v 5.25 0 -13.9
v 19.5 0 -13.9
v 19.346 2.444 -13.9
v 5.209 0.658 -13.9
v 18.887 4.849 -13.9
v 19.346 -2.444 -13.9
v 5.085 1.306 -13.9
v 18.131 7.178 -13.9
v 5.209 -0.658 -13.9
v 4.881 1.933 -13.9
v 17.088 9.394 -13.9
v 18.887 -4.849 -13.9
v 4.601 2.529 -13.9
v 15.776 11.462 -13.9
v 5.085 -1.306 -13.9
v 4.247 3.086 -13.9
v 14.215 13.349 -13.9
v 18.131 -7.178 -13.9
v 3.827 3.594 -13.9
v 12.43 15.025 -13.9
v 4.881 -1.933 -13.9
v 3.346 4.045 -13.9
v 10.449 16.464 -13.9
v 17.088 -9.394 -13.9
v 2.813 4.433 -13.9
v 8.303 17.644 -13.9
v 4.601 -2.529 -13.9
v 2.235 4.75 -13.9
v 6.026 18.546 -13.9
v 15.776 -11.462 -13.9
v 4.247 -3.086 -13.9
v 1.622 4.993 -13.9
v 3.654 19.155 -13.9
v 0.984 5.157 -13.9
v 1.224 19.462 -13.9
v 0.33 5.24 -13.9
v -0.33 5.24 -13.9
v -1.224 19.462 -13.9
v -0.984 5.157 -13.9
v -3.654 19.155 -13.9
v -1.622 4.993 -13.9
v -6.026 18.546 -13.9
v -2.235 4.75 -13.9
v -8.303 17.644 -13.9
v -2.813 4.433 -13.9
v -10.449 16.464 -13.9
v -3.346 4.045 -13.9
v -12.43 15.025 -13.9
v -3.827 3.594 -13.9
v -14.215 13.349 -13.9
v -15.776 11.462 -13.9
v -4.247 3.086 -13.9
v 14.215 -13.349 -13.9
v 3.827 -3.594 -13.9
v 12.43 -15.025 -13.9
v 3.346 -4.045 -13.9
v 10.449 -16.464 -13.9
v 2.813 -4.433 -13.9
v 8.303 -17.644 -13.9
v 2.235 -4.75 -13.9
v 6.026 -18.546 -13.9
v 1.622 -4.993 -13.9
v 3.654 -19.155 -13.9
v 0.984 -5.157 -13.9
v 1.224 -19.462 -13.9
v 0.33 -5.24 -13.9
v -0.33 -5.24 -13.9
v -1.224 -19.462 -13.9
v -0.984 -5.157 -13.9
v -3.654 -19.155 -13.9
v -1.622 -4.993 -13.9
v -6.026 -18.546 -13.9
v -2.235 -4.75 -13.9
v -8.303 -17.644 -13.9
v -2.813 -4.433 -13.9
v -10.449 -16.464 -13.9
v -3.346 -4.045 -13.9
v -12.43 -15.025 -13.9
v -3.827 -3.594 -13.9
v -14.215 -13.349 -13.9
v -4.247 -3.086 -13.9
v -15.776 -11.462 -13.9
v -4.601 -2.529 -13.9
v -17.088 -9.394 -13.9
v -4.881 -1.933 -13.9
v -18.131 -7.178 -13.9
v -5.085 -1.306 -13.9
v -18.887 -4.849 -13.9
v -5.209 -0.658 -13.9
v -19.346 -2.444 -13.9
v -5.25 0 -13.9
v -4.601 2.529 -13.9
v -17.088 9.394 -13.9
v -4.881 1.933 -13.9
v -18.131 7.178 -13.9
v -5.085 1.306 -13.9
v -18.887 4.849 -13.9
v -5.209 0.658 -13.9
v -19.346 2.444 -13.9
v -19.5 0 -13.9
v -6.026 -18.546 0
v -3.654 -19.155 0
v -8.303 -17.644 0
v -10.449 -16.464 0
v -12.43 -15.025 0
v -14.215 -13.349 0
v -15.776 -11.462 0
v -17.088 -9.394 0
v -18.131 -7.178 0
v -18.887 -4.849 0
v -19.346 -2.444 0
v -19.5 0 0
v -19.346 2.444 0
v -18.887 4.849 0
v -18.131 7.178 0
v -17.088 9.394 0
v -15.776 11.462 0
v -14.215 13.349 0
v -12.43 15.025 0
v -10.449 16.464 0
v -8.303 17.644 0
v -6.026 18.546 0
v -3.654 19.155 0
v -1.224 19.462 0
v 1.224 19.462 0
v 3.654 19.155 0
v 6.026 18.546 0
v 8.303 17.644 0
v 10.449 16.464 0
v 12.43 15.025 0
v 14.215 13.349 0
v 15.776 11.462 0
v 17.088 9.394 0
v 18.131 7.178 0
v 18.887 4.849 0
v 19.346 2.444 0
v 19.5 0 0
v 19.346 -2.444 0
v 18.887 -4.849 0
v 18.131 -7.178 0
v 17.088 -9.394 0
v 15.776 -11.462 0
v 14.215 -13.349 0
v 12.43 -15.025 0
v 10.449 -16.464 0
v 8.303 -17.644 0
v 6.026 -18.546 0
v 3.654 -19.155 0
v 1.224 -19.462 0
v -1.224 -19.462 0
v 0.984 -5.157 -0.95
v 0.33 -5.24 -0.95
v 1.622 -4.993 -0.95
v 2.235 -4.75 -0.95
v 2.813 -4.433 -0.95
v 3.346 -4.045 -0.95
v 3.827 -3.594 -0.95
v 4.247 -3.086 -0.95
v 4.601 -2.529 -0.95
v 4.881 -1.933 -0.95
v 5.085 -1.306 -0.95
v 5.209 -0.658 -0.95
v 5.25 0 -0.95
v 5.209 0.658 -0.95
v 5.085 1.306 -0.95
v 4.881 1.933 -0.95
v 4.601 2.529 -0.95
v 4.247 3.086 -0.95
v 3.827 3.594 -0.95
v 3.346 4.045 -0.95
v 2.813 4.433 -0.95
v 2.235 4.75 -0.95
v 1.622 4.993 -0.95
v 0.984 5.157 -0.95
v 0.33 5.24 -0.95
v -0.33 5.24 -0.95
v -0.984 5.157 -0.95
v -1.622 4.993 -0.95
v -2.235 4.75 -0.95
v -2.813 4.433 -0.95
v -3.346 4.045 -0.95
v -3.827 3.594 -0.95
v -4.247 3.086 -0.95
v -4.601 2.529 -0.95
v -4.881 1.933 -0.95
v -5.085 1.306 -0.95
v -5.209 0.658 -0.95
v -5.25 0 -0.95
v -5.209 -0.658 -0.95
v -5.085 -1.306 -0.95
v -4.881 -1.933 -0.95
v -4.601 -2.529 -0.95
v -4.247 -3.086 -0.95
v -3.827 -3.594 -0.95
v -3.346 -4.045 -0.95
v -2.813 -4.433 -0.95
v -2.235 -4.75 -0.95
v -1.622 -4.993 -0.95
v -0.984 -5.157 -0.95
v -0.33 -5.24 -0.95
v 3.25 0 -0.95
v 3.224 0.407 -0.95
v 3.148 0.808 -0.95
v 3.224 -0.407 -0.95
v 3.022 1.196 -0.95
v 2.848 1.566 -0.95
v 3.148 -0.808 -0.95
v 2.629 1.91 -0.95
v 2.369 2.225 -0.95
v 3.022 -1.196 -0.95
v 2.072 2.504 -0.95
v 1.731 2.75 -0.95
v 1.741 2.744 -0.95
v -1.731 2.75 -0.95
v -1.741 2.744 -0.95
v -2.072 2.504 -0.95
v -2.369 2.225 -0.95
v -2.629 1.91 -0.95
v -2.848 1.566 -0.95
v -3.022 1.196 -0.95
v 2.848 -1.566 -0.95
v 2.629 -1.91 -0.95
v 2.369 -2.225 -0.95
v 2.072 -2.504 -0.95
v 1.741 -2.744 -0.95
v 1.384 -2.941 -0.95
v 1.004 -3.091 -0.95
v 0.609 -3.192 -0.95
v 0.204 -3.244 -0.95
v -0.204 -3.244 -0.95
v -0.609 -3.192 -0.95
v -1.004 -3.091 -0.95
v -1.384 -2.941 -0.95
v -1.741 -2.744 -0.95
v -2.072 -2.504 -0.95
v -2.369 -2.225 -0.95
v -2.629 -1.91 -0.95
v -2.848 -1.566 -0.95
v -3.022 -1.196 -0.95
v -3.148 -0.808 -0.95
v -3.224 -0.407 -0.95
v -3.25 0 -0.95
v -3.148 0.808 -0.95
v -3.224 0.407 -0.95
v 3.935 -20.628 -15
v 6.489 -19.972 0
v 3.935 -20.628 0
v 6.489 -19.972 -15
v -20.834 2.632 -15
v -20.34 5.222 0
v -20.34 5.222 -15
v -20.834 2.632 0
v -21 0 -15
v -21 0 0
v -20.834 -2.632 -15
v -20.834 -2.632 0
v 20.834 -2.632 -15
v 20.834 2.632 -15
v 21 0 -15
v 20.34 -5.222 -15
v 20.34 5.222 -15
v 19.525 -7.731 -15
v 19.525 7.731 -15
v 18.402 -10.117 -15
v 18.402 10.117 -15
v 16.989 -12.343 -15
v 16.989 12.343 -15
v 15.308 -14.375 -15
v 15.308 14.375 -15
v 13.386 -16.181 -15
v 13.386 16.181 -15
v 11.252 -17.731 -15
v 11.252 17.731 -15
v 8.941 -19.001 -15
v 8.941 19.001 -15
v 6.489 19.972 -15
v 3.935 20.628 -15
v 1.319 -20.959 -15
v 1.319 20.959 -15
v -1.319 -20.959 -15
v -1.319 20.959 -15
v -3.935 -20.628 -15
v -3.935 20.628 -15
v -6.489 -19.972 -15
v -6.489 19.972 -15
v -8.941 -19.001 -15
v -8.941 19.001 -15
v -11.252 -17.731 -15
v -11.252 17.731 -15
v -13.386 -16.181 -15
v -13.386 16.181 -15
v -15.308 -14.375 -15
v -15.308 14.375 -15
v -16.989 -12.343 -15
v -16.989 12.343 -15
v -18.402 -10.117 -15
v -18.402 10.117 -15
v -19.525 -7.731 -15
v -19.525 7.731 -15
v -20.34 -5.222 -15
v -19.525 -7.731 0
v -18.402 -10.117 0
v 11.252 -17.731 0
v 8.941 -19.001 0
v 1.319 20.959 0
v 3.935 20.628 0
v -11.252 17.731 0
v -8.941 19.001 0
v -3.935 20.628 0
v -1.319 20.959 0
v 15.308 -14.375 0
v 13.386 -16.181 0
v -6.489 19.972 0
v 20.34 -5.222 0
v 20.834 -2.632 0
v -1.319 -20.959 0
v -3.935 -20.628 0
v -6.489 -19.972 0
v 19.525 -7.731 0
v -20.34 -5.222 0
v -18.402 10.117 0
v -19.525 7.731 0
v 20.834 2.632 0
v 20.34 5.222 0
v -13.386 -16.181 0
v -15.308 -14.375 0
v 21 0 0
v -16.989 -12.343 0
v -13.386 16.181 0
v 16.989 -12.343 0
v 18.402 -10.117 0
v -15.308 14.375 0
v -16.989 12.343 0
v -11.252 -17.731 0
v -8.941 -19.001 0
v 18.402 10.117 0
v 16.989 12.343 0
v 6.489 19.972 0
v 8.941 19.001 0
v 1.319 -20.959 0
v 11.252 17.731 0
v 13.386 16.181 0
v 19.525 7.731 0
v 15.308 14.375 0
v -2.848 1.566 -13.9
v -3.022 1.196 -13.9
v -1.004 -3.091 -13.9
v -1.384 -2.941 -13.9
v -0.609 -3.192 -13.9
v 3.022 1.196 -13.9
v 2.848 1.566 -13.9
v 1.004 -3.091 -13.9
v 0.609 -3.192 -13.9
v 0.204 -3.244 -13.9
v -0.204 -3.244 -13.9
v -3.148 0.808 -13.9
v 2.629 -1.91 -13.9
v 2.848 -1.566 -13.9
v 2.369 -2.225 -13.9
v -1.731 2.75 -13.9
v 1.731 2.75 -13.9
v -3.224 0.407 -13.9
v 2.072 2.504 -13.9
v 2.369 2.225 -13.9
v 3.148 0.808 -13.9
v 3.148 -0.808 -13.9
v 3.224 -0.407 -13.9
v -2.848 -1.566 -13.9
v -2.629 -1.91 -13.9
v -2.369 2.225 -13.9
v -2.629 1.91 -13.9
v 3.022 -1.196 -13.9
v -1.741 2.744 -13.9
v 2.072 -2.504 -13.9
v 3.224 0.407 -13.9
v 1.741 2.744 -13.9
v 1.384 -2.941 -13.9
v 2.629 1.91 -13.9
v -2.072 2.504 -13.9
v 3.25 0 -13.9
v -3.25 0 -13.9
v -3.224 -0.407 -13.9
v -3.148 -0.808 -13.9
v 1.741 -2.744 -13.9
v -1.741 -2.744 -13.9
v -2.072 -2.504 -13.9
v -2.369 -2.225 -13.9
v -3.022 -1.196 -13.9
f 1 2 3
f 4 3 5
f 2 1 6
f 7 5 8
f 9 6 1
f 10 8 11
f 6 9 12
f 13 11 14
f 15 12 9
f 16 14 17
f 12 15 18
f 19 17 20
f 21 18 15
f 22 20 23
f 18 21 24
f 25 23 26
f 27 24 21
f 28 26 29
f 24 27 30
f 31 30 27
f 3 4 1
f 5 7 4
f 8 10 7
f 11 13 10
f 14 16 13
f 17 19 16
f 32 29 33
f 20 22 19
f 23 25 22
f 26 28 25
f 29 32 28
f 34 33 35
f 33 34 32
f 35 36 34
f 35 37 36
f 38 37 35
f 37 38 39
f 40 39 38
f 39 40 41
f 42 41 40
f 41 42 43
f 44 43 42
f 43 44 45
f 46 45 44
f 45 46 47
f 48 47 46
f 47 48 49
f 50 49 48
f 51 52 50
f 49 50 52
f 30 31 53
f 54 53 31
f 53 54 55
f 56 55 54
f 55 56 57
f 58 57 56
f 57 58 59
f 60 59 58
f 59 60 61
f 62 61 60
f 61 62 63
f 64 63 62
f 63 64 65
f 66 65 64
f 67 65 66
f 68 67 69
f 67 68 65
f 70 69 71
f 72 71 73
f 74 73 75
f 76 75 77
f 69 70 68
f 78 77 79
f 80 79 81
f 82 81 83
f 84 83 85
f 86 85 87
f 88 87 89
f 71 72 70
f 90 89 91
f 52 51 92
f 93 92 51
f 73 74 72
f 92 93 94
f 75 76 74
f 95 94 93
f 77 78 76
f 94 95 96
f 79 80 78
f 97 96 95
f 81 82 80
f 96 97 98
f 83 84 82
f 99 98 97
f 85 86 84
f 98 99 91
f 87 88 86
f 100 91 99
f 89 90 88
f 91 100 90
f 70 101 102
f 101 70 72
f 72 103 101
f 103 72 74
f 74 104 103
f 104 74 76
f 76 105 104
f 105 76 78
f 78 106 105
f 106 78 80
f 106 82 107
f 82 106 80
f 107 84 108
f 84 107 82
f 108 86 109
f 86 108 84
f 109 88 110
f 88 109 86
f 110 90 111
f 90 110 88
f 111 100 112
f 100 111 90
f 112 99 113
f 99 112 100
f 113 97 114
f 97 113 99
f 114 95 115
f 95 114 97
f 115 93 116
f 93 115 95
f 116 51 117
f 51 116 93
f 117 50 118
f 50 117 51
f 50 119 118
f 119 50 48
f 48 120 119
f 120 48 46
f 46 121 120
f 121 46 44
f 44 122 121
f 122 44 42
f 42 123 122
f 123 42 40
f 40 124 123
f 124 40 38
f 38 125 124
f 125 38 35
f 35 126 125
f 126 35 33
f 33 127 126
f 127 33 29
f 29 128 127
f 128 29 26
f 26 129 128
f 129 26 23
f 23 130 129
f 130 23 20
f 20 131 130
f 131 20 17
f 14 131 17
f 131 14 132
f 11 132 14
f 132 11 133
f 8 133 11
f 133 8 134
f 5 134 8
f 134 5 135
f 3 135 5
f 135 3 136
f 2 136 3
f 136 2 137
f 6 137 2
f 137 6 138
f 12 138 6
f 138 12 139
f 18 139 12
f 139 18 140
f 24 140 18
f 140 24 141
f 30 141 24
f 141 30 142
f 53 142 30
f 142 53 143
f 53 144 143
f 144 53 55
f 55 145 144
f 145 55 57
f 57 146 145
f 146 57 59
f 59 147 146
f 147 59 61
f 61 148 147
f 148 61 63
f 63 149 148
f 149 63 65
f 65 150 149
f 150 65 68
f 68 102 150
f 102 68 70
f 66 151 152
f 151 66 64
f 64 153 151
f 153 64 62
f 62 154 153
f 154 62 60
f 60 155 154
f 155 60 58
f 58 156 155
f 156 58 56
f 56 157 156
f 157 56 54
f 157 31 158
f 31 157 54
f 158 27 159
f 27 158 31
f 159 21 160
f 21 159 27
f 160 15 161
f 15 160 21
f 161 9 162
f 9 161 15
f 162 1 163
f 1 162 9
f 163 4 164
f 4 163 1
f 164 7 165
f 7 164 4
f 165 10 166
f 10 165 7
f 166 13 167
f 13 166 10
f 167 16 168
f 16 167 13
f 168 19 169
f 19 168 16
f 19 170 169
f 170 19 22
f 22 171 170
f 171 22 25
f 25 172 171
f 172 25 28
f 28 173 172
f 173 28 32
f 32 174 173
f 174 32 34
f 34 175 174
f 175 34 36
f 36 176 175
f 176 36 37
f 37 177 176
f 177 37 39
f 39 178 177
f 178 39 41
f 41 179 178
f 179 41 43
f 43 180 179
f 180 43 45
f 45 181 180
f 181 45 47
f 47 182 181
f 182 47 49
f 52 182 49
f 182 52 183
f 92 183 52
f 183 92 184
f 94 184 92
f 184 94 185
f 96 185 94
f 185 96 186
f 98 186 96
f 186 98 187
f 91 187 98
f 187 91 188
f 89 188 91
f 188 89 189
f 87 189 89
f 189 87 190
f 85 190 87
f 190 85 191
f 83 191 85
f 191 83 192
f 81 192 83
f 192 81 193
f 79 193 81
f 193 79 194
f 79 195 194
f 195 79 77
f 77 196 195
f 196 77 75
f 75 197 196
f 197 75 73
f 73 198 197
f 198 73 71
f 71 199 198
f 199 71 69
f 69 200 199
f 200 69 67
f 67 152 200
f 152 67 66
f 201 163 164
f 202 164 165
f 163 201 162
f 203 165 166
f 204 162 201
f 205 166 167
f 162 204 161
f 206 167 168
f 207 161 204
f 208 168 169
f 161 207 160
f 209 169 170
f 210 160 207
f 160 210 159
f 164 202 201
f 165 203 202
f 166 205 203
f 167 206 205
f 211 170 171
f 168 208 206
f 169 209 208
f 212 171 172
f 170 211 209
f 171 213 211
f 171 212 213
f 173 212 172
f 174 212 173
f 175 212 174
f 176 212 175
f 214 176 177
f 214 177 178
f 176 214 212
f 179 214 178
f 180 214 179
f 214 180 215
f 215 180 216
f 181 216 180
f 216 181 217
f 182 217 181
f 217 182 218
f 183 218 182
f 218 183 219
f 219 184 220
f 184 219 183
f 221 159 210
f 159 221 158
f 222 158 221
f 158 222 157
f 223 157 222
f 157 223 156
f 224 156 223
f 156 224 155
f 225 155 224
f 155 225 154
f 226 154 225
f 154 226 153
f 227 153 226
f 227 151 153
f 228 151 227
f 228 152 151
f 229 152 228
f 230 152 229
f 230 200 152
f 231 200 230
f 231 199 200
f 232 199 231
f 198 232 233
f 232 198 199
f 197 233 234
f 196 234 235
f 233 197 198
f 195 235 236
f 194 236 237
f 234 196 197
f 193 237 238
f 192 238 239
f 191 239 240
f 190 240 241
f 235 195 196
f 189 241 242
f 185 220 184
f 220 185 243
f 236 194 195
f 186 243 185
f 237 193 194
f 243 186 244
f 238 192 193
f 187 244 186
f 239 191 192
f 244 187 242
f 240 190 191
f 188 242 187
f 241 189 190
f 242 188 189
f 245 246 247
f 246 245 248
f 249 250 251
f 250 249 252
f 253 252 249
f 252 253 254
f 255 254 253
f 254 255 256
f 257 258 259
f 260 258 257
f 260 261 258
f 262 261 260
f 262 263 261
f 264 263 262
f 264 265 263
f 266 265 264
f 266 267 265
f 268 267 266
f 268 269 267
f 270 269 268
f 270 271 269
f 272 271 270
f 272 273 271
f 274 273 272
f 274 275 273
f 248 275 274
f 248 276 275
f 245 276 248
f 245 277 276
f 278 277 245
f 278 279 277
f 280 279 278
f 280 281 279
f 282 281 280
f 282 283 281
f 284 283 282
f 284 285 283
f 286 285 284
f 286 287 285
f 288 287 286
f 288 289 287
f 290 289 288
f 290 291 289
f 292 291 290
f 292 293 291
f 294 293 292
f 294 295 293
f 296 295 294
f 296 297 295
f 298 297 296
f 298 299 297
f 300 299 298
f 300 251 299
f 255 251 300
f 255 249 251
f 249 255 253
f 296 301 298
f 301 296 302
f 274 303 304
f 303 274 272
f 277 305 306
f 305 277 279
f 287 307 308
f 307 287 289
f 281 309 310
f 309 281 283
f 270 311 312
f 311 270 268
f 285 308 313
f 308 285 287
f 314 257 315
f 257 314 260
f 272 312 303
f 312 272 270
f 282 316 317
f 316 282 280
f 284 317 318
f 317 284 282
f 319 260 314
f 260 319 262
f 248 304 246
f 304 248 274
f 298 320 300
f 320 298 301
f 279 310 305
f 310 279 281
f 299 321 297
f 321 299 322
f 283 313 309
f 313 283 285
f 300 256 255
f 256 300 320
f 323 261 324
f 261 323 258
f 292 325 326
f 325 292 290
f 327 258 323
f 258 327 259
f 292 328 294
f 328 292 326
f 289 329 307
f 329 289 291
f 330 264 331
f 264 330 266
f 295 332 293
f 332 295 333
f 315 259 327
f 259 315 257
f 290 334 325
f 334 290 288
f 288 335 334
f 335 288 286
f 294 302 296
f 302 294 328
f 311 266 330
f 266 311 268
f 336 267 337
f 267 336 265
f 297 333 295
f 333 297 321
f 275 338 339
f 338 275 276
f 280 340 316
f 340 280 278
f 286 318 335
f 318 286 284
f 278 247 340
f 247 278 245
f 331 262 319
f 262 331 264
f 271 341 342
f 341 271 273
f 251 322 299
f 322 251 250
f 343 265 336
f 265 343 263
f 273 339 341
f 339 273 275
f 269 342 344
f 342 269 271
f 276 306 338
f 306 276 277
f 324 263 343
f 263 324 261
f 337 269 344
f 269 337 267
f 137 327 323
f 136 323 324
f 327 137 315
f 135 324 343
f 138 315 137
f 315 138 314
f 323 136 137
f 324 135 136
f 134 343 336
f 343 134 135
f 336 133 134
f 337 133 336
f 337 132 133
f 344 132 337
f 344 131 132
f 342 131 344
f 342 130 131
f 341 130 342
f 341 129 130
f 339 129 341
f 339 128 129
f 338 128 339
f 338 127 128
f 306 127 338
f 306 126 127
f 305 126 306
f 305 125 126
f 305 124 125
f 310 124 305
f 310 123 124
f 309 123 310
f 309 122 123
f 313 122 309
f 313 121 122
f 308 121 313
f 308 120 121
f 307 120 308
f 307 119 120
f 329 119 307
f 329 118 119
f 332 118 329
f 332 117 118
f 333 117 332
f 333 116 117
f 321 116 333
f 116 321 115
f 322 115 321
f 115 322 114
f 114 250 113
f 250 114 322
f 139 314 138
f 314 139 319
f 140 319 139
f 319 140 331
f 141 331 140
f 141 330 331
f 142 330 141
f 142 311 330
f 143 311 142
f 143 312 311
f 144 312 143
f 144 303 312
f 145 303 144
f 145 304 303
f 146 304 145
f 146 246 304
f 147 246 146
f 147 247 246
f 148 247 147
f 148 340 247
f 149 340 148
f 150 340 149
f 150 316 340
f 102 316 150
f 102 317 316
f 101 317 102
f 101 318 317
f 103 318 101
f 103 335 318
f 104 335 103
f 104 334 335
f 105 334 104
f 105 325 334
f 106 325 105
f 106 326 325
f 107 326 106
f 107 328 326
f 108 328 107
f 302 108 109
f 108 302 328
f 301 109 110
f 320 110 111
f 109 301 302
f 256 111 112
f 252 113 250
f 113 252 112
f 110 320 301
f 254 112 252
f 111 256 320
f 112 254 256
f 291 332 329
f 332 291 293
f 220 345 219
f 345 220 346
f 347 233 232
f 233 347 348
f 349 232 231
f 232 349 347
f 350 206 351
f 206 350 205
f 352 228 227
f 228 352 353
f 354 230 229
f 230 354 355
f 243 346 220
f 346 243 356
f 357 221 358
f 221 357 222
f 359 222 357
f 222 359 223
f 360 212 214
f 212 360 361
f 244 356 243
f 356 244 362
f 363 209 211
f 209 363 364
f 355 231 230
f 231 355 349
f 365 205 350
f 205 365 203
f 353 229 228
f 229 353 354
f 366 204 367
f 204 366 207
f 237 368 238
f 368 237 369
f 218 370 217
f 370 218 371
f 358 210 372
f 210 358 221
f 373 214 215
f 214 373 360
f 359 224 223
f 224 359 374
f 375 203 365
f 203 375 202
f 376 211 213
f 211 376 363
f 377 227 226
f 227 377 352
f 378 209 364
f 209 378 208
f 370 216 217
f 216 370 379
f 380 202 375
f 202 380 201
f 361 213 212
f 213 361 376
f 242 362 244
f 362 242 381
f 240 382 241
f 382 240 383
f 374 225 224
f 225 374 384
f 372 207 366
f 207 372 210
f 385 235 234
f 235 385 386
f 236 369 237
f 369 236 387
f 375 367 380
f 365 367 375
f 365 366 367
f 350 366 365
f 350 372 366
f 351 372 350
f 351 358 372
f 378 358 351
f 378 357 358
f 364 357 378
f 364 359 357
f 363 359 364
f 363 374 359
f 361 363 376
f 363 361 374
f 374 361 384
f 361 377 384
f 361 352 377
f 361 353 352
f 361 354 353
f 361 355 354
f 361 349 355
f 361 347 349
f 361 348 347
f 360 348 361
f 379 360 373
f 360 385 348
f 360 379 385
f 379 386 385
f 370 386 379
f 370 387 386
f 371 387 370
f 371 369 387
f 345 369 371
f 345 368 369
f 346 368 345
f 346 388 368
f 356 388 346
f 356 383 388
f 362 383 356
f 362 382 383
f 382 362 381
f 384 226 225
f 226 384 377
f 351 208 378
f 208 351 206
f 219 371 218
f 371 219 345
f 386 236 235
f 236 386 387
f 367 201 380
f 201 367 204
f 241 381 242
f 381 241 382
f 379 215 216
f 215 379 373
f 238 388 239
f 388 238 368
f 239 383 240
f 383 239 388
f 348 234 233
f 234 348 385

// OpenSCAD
//Author: Philipp Hufnagl
//Licence: Creative Commons CC-BY-SA

$fn=50;

buttonWidth=42;
buttonHeight=15;

holeHeight= 14;
holeWidth = 6.5;
holeCut = 6;

makeHollow=0; // [0:yes, 1:no]
makeHandle=1;  // [0:yes, 1:no]
handleLength= 25;
handleWidth= 8;


//workaround so this is not configureable
overlap = 0.05	*1.0;

//makes button hollow
module ringCutout(){
	union()
	{
	translate([0,0,-overlap])
		linear_extrude(height= holeHeight - overlap){
			difference(){
				scale(buttonWidth-3)
					circle(r=0.5);

				scale(holeWidth+4)
					circle(r=0.5);
			}
		}
		translate([0,0,-overlap])
		linear_extrude(height= 1){
			scale(buttonWidth -5)
					circle(r=0.5);
		}
	}
}

//hole in the middle
module hole(){
	translate([0,0,-overlap])
	linear_extrude(height= holeHeight - overlap){
		
		difference()
		{
			scale(holeWidth)
			circle(r=0.5);
			translate([-holeWidth/2,-holeWidth/2 +  holeCut])
				square([holeWidth,holeWidth]);
		}
	}
}

//the main form of the button
module button(){
	translate([0.0,0.0,0.0])
	linear_extrude(height=buttonHeight){
		scale(buttonWidth)
			circle(r=0.5);
	}
}


//a grip (not used for this button)
module handle()
{
translate([0,-handleWidth/2,buttonHeight])
rotate([-90,0,0])
	linear_extrude(height=handleWidth)
	{
		difference()
		{
			scale(handleLength)
				circle(r=0.5);
			translate([-handleLength/2,overlap])
				square([handleLength,handleLength]);
		}
	}
}
rotate([0,180,0])
union()
{
difference()
{	
	button();
	hole();
if(makeHollow == 0)
	ringCutout();
}
if(makeHandle == 0)
	handle();
}
